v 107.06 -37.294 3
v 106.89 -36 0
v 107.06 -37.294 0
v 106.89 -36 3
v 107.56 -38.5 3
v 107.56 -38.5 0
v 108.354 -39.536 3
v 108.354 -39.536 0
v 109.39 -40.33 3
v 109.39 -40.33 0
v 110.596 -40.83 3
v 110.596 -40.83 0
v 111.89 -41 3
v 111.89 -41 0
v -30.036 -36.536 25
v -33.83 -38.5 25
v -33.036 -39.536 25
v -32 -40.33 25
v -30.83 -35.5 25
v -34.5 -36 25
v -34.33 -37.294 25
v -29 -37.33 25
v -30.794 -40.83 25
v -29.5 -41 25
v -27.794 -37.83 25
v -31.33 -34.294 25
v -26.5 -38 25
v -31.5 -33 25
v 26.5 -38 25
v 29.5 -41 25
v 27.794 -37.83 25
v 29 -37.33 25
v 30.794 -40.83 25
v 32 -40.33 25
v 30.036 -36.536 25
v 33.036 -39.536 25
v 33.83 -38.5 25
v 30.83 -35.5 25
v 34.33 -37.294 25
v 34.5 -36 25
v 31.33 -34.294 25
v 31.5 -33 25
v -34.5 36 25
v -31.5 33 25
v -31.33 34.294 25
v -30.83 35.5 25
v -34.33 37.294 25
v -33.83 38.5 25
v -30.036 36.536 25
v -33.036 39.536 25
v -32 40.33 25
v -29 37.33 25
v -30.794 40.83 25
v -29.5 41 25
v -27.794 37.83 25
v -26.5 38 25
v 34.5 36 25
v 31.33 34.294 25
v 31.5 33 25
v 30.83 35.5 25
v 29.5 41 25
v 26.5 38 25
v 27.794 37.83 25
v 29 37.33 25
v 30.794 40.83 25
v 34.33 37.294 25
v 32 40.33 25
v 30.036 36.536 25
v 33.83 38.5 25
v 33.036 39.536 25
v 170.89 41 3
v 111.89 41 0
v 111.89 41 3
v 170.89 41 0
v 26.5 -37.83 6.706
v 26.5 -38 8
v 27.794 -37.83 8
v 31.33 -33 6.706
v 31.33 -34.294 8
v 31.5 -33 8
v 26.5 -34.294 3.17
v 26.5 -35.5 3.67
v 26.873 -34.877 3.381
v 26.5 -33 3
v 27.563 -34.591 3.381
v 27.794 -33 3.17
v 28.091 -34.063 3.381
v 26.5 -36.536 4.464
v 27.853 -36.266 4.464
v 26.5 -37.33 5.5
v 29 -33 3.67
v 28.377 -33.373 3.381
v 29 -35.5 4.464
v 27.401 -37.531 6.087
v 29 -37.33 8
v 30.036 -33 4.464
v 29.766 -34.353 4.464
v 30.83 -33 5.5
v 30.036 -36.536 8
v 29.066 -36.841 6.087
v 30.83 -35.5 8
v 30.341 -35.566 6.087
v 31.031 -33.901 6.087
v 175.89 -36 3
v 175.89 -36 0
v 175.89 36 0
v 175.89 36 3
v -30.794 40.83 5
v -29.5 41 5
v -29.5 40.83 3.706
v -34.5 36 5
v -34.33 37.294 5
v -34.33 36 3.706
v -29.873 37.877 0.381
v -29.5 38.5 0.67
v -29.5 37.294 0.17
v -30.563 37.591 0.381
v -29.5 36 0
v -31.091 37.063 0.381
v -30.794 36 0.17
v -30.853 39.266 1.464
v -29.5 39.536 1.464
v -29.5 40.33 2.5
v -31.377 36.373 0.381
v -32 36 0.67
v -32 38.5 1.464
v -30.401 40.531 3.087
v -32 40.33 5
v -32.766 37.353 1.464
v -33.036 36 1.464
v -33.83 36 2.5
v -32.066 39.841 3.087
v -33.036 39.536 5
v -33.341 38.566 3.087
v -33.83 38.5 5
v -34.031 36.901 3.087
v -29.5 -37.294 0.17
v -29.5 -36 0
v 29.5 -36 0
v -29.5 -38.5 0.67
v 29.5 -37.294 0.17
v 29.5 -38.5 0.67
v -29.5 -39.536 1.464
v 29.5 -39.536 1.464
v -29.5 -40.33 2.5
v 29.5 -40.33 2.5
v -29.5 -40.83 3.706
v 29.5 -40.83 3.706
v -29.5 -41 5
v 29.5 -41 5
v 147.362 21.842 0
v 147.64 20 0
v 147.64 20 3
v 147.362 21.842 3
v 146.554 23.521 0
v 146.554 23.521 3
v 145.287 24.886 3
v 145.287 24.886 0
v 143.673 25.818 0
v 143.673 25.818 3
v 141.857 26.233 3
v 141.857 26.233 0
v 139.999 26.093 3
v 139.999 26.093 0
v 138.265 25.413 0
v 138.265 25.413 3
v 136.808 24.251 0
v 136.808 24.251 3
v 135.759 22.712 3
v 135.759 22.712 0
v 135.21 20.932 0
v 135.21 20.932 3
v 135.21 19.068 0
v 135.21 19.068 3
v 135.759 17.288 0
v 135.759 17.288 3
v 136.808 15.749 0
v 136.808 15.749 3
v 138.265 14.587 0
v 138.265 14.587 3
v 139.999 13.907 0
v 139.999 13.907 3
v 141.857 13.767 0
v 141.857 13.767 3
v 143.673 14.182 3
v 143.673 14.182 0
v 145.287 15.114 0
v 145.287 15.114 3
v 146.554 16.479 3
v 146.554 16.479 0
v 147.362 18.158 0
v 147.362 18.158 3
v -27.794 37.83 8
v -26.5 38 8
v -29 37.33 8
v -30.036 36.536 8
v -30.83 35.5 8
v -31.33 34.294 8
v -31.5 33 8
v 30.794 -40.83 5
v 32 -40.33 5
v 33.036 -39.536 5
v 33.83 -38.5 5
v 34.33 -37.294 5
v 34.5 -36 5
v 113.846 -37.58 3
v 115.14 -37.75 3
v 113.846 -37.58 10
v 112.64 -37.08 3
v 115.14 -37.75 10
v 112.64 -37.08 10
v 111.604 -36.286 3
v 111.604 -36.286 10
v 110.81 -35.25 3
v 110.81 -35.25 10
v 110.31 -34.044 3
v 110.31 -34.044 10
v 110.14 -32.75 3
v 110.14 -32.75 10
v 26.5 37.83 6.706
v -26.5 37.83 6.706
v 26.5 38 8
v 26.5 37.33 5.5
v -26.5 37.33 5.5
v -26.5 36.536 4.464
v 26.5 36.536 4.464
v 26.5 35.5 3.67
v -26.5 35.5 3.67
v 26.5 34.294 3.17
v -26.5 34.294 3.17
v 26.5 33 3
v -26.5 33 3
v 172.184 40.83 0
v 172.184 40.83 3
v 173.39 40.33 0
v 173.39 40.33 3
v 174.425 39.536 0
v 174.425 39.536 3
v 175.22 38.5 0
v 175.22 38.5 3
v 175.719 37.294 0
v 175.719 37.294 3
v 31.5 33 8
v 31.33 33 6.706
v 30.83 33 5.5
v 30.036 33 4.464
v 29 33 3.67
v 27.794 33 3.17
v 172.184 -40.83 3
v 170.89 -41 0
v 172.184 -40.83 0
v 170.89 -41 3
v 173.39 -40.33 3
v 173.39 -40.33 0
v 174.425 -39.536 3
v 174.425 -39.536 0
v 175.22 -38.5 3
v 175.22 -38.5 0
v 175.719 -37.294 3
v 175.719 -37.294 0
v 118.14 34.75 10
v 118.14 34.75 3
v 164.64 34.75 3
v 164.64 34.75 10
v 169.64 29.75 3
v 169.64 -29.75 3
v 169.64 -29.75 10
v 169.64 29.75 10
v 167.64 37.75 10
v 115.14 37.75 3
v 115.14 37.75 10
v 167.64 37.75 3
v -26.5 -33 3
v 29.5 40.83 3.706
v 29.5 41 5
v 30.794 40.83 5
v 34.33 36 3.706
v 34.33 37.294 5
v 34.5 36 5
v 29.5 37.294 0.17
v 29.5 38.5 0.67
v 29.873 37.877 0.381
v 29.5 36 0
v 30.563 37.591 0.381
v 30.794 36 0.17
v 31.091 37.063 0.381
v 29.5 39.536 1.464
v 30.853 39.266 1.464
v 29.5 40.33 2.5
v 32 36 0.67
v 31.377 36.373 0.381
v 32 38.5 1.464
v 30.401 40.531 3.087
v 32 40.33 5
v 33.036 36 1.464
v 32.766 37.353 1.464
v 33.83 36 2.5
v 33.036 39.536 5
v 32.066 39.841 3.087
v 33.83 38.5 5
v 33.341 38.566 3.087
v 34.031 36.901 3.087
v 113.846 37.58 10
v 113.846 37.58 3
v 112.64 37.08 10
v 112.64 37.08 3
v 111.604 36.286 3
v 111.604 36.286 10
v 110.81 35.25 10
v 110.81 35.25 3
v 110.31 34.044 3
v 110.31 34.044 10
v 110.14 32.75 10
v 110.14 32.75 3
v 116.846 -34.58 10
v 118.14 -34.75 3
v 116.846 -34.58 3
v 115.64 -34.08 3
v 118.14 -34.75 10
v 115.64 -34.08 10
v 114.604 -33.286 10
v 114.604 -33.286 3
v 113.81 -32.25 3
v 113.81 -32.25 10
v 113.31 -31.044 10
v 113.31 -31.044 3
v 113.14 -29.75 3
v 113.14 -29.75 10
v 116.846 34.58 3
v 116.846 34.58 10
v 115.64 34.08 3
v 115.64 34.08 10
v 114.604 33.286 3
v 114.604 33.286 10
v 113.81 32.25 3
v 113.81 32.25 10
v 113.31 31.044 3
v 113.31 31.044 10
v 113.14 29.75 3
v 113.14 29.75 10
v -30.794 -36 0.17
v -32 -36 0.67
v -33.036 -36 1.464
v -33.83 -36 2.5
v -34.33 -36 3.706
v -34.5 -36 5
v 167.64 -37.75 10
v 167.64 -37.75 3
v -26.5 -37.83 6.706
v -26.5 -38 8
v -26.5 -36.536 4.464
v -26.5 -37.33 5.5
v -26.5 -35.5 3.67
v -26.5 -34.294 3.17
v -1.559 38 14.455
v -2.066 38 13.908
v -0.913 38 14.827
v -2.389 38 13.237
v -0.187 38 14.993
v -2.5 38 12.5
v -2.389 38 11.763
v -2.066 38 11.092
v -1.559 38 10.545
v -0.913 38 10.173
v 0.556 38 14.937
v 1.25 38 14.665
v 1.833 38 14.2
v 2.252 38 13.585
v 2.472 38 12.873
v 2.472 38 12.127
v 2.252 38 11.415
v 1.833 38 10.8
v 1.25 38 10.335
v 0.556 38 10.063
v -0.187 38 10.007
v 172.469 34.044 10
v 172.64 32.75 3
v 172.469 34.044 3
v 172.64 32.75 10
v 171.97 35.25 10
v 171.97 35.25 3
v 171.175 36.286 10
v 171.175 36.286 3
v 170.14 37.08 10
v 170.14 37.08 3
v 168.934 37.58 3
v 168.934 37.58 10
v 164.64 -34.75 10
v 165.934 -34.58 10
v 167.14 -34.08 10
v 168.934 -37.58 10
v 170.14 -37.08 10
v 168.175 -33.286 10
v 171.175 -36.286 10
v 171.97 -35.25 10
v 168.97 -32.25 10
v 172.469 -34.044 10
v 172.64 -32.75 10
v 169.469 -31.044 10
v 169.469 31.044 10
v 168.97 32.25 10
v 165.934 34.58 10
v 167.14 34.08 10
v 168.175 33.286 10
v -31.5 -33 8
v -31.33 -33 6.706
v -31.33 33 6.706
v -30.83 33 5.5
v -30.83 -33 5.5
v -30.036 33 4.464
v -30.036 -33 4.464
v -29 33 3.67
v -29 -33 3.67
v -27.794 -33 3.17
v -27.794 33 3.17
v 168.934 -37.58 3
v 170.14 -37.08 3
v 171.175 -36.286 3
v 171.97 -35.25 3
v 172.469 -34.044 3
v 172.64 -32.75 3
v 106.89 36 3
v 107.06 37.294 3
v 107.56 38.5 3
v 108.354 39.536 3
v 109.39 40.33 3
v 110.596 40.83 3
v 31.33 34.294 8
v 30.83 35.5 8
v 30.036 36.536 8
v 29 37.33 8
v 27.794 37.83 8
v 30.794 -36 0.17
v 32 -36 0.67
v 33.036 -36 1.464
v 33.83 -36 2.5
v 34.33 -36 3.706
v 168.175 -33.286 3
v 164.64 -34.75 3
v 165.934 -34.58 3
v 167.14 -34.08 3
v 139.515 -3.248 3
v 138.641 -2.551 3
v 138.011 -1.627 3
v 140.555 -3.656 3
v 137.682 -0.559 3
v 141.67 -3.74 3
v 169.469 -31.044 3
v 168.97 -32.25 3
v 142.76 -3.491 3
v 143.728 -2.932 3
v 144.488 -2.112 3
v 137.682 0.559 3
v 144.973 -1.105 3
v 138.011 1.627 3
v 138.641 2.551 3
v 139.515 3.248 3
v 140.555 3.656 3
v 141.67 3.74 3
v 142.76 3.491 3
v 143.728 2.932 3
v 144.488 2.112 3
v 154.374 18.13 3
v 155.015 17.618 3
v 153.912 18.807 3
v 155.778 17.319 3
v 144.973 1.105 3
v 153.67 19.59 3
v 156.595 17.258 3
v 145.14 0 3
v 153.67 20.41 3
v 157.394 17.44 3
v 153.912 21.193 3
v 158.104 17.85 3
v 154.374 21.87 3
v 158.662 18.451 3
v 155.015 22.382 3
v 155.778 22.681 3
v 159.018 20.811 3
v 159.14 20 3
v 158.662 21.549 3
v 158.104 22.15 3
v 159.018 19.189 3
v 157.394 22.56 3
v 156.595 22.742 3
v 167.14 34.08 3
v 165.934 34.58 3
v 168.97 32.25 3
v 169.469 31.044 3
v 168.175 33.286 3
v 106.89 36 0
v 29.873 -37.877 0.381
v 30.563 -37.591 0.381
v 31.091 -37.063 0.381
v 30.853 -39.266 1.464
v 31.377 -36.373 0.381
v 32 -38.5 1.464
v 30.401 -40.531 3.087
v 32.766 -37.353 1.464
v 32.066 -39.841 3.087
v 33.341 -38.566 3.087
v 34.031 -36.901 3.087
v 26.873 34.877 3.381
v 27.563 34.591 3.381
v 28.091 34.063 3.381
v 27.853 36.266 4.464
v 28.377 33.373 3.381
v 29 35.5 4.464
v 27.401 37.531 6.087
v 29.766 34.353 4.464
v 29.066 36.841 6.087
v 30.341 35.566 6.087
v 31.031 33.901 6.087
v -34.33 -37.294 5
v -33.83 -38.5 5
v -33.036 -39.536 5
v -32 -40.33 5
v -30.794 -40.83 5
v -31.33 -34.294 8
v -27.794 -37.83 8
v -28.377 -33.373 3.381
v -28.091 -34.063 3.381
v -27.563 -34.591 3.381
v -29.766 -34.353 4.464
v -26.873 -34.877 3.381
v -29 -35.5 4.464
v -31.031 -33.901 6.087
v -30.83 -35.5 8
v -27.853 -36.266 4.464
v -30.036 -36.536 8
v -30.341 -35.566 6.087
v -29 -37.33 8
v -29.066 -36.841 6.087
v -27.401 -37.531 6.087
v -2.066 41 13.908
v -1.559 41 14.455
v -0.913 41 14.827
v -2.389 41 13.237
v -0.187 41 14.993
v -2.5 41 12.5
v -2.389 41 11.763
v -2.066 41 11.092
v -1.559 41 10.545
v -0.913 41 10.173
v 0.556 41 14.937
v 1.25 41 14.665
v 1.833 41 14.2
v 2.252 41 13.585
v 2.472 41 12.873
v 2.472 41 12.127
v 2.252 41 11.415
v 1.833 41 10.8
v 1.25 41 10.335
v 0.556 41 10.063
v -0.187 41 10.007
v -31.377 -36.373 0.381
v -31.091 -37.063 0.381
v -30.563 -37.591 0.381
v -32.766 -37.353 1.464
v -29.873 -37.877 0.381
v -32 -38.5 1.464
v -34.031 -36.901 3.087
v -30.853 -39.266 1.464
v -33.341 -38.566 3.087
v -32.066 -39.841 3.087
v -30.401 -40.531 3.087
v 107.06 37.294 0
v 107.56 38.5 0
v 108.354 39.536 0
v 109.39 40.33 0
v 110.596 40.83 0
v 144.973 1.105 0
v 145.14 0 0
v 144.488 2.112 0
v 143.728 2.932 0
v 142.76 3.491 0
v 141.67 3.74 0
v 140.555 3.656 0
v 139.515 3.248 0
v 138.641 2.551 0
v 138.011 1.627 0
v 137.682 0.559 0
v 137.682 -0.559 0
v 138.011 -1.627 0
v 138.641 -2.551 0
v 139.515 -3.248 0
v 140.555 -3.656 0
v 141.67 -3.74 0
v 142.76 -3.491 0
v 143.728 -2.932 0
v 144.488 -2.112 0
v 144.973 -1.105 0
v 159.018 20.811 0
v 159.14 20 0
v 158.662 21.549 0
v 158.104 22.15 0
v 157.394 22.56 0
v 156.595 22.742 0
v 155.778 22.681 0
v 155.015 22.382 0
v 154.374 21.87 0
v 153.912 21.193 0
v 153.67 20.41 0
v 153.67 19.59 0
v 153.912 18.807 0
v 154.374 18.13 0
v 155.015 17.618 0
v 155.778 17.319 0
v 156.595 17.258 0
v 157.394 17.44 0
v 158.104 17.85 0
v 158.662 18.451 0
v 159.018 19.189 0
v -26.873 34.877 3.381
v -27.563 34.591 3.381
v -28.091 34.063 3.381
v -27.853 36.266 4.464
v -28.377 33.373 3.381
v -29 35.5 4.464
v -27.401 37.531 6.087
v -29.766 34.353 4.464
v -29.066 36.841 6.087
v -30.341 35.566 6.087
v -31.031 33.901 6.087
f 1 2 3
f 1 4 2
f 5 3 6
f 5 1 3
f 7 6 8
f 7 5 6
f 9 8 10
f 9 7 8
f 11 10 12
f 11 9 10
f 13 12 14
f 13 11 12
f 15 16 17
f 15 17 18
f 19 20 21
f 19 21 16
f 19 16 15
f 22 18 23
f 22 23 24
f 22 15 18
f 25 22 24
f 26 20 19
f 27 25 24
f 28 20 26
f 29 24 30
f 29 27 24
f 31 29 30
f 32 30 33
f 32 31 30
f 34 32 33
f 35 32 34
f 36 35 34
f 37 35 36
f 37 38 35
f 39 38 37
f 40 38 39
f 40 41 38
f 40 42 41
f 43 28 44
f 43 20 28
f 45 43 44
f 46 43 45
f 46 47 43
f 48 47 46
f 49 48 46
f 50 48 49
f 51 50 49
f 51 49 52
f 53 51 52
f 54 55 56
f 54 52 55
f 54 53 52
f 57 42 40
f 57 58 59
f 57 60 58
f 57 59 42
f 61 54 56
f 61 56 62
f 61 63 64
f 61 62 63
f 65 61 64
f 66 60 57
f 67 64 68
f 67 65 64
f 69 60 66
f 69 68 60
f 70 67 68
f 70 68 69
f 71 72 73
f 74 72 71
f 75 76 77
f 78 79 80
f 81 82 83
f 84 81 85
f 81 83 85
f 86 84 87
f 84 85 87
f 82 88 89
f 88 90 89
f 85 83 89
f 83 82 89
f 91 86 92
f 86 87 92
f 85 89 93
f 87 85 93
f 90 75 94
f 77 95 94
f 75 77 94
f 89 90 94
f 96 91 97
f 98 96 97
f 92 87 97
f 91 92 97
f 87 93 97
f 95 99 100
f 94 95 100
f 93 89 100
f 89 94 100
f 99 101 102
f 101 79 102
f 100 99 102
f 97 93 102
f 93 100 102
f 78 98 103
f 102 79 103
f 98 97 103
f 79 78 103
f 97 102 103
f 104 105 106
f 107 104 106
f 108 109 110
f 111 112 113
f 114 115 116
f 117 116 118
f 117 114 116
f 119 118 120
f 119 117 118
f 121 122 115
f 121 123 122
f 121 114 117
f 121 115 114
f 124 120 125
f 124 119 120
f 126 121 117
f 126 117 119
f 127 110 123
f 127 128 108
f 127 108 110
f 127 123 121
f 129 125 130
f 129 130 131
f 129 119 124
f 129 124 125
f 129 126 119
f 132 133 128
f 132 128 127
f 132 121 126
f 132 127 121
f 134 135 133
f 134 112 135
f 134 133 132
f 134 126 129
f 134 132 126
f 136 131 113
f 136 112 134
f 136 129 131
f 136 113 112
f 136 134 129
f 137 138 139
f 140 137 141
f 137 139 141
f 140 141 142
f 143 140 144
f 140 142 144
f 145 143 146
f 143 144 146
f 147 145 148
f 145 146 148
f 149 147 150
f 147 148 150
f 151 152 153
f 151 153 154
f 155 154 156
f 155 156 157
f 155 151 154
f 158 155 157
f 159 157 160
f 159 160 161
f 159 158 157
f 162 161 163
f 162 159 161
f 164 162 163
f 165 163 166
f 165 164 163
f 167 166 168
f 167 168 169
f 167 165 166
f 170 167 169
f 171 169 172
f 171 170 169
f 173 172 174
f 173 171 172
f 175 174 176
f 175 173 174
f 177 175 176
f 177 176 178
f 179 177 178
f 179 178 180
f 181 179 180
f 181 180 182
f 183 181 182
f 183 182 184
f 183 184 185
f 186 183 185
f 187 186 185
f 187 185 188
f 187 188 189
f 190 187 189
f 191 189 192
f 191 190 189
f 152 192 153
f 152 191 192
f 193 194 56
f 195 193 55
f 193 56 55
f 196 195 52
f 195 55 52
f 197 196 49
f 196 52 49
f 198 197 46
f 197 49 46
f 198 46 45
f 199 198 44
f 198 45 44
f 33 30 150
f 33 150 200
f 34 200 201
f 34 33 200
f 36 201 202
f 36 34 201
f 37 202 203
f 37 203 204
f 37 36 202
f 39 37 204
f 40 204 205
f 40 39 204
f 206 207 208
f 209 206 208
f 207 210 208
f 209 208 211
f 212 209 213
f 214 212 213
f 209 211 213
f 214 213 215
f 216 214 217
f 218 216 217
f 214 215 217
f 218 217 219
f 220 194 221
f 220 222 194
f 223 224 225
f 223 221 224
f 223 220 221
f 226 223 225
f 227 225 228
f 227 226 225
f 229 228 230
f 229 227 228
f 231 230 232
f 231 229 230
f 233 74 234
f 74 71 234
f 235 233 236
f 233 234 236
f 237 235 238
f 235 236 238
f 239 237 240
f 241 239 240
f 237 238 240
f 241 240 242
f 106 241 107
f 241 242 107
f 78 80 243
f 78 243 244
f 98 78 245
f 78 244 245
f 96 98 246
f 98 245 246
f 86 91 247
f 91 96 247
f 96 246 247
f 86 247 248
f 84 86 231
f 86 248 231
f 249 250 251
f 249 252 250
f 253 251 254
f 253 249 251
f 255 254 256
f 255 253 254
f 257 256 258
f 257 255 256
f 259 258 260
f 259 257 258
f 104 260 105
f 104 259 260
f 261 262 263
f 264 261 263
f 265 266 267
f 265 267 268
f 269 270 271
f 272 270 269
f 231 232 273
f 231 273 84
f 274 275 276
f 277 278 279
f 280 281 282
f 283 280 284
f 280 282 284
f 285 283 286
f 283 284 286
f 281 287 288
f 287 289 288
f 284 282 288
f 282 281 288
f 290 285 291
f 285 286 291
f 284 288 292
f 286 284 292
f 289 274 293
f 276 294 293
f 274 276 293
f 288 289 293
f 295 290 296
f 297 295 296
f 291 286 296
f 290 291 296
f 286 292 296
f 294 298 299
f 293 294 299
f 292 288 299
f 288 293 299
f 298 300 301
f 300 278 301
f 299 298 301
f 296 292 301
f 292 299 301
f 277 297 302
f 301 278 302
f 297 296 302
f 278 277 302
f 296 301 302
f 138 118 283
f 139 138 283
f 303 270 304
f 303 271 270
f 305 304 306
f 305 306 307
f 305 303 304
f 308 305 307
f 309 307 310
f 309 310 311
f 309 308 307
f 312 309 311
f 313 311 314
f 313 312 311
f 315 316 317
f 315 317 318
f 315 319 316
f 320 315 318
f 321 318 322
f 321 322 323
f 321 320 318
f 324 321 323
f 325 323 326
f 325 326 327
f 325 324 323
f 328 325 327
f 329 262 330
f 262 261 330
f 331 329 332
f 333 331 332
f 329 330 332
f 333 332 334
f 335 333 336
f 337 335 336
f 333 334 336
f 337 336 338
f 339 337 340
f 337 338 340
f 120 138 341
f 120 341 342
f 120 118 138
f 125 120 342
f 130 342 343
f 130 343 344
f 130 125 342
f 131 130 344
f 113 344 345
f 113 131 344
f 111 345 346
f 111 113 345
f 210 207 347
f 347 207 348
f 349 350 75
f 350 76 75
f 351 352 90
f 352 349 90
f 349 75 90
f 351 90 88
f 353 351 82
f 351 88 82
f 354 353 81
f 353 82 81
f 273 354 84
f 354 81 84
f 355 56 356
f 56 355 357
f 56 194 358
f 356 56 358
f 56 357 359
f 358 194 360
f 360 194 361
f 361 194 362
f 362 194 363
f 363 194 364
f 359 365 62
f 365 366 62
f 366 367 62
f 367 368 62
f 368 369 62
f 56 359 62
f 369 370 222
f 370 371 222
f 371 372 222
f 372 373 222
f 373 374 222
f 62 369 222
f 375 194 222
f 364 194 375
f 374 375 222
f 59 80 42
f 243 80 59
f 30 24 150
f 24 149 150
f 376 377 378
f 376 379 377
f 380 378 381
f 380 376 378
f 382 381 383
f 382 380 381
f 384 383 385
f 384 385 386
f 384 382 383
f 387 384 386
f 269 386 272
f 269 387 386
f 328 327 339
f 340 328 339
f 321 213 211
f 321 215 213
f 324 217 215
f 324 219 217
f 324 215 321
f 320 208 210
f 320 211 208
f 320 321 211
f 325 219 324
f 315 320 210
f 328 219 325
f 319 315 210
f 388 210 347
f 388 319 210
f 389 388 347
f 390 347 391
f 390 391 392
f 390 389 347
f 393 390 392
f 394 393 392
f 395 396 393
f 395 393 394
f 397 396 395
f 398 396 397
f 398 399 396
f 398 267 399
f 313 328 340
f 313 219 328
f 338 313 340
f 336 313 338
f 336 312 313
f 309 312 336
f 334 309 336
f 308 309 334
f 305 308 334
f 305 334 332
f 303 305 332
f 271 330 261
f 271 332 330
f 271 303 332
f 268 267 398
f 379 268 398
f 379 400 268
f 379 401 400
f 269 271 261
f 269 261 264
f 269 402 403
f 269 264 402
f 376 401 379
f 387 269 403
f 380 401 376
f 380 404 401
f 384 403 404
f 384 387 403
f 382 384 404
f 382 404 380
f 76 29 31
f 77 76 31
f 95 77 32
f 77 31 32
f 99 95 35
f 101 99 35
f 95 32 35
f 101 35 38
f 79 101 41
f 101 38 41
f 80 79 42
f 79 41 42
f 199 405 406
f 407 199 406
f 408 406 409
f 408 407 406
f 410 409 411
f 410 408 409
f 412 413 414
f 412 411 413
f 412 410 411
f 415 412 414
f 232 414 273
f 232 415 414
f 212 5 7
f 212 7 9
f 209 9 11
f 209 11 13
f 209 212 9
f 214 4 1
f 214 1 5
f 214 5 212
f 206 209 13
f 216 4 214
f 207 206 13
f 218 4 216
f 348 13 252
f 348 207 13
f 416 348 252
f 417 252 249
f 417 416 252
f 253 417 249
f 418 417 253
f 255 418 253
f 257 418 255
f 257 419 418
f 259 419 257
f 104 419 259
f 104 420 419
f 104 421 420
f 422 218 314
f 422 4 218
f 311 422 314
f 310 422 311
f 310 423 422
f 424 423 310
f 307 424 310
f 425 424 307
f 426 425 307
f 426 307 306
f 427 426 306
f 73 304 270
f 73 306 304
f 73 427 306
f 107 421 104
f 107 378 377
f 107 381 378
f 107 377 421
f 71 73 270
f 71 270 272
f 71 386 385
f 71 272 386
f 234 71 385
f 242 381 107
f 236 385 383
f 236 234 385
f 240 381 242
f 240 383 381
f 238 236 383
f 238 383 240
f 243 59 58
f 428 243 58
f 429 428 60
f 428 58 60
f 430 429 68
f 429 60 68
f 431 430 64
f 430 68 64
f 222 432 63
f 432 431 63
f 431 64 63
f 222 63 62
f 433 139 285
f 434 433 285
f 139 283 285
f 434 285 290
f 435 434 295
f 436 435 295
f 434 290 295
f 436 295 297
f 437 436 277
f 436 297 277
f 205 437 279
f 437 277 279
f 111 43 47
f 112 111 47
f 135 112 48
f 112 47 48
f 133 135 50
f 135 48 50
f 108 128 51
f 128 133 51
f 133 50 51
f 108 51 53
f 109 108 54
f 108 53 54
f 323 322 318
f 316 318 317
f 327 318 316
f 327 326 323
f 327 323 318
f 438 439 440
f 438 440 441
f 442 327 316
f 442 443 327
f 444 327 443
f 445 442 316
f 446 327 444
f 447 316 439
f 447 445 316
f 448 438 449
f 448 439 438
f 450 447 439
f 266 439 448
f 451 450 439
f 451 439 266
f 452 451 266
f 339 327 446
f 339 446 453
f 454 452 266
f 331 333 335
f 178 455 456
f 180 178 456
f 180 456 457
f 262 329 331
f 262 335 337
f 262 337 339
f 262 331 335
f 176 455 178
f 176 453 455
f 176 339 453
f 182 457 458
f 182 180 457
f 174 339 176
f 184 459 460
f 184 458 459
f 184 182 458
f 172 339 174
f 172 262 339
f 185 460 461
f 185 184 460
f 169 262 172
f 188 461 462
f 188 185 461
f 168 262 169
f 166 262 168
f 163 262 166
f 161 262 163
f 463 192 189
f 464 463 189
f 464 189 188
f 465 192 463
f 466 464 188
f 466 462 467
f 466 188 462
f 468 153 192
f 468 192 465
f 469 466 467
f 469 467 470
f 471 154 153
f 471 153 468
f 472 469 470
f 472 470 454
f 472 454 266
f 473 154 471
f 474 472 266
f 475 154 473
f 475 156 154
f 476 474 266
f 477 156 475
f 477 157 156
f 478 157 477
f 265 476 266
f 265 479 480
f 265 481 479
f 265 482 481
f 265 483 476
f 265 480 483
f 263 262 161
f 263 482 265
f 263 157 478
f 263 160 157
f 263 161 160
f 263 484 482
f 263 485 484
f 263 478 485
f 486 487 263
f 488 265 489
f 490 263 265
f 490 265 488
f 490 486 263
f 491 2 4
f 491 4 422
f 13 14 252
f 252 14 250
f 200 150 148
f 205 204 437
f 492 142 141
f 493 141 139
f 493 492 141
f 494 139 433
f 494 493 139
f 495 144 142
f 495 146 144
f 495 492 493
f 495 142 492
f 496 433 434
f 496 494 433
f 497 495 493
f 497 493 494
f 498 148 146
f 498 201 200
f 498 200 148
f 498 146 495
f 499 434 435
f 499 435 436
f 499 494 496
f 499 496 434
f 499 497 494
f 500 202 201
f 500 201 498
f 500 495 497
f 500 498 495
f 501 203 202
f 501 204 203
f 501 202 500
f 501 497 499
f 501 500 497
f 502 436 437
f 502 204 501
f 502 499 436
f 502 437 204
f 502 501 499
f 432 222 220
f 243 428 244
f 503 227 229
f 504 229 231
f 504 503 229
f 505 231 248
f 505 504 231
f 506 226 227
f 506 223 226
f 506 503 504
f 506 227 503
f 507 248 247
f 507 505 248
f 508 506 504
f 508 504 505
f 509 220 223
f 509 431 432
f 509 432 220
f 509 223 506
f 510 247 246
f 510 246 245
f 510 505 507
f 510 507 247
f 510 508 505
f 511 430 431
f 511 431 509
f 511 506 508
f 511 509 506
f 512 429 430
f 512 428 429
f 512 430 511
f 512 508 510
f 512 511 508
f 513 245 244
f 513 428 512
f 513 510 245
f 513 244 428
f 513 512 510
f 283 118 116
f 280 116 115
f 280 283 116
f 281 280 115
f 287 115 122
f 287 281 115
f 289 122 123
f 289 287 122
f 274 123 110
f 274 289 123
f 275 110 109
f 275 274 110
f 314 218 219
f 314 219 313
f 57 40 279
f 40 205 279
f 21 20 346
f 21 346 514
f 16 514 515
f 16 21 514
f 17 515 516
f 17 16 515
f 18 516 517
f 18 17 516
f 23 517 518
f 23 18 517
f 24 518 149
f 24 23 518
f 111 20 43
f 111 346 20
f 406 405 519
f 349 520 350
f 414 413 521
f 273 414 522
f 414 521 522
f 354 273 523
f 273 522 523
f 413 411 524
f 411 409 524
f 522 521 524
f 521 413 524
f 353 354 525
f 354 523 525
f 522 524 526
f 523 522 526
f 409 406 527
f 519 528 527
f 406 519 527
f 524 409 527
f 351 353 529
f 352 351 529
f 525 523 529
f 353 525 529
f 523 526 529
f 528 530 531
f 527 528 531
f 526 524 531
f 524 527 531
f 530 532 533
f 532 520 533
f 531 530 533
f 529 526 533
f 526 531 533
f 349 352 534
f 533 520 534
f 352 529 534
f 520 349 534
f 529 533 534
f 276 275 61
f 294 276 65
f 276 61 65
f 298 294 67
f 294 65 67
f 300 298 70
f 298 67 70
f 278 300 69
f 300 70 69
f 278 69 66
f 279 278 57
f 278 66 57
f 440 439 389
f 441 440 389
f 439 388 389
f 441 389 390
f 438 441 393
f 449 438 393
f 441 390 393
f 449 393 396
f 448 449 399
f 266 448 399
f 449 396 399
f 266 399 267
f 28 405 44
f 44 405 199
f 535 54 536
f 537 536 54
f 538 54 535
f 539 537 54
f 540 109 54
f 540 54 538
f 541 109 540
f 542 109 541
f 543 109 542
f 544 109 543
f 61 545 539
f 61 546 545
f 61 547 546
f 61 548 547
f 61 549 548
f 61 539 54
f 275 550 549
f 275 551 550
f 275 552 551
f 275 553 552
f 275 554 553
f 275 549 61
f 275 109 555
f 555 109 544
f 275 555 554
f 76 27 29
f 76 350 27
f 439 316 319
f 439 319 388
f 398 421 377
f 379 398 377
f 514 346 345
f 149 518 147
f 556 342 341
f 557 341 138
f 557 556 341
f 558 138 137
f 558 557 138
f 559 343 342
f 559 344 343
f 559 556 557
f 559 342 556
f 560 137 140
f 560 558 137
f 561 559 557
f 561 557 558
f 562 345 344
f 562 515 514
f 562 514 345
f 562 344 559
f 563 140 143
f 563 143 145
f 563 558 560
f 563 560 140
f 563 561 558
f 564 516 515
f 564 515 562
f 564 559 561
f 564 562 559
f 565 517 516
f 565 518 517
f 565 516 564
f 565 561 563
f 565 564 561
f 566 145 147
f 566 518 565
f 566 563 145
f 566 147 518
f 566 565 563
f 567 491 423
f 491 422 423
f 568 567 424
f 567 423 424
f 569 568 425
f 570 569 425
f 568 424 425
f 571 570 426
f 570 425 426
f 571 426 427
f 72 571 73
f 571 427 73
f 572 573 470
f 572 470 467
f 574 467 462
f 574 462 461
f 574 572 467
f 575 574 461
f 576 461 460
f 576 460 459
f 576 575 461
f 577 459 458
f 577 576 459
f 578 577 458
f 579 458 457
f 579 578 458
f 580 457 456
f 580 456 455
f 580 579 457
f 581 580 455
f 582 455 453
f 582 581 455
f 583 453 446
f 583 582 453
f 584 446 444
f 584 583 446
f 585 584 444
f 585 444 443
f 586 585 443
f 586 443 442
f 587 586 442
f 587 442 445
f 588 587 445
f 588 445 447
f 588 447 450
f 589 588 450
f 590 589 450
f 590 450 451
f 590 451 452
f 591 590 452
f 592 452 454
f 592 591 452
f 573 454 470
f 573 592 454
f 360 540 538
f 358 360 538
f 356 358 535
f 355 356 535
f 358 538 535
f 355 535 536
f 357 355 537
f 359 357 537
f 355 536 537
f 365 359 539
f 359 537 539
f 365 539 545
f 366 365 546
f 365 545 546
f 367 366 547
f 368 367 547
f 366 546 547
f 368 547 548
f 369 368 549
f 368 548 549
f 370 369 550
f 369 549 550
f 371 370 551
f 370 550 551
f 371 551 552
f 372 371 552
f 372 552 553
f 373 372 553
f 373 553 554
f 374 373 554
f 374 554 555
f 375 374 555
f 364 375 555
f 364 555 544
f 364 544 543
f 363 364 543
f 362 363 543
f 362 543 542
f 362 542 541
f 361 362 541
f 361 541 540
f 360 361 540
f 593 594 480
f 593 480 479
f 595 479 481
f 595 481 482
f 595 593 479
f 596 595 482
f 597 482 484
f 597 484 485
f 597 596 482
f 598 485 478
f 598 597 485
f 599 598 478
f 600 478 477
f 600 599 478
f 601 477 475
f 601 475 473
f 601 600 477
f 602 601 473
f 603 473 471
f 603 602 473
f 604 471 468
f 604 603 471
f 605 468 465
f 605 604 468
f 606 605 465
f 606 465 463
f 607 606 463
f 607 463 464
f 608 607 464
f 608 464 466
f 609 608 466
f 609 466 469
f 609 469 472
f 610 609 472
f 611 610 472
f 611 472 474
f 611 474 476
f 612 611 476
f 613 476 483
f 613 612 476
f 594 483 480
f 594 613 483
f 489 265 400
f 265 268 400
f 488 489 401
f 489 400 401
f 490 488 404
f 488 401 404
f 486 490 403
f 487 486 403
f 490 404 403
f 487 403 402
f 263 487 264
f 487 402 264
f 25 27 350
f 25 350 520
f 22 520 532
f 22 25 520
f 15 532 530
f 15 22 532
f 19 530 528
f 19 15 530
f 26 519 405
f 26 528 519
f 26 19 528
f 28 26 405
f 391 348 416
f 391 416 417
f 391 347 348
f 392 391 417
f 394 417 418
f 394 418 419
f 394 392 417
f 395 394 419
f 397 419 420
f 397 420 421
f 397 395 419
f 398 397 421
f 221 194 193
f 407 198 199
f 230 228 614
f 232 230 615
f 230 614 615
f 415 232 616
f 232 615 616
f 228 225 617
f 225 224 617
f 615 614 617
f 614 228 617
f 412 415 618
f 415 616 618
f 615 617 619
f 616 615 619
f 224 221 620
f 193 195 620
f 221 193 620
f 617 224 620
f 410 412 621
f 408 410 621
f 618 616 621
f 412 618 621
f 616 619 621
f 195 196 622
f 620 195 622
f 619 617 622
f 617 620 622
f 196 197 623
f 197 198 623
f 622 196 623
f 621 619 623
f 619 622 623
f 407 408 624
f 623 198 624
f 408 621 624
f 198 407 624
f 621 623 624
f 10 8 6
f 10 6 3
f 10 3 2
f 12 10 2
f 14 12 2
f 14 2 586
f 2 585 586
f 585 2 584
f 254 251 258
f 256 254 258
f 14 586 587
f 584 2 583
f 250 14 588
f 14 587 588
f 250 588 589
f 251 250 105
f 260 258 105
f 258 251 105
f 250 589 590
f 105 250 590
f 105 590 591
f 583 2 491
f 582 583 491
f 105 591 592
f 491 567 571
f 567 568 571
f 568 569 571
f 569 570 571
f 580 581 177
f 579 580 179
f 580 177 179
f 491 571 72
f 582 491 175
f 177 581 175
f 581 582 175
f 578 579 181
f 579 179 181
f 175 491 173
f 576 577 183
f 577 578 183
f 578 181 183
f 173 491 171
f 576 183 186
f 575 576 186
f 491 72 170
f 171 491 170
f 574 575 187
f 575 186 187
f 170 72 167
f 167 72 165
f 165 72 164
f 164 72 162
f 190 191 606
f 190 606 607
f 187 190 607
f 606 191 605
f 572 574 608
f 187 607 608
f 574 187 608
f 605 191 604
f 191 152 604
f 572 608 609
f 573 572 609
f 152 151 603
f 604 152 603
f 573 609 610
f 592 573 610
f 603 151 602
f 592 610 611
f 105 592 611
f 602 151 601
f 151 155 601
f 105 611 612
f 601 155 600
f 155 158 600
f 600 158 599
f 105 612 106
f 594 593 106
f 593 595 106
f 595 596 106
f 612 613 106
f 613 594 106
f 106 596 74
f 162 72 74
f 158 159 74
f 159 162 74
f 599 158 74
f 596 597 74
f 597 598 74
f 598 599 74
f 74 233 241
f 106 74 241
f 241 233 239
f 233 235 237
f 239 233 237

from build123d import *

# Parameters (mm, degrees)
F0_W     = 69
F0_H     = 82
F0_W_2   = 63
F0_H_2   = 76
F1_DEPTH = 25
F2_DEPTH = 3
F0_W_3   = 62.5
F0_H_3   = 75.5
F0_W_4   = 56.5
F0_H_4   = 69.5
F3_DEPTH = 10
F0_R     = 3.75
F0_R_2   = 6.25
F0_R_3   = 2.75
F4_DEPTH = 3
F5_R     = 5
F5_2_R   = 5
F6_R     = 2.5
F7_DEPTH = 25


with BuildPart() as f1:
    # F0 (on Top) → F1 (new body)
    with BuildSketch(Plane.XY):
        Rectangle(F0_W, F0_H)
        Rectangle(F0_W_2, F0_H_2, mode=Mode.SUBTRACT)
    extrude(amount=F1_DEPTH)

    # F0 (on Top) → F2 (join)
    with BuildSketch(Plane.XY):
        Rectangle(F0_W_2, F0_H_2)
    extrude(amount=F2_DEPTH)

    # F5
    f5_edges = [f1.edges().sort_by_distance(p)[0] for p in [
        (34.5, 41, 12.5),
        (31.5, 38, 14),
        (-31.5, 38, 14),
        (-34.5, 41, 12.5),
        (34.5, -41, 12.5),
        (31.5, -38, 14),
        (-34.5, -41, 12.5),
        (-31.5, -38, 14),
        (0, 41, 0),
        (-34.5, 0, 0),
        (0, -41, 0),
        (34.5, 0, 0),
        (0, 38, 3),
        (-31.5, 0, 3),
        (0, -38, 3),
        (31.5, 0, 3),
    ]]
    fillet(f5_edges, radius=F5_R)

    # F6 (on face) → F7 (cut)
    with BuildSketch(Plane(origin=(0, 41, 0), x_dir=(-1, 0, 0), z_dir=(0, 1, 0))):
        with Locations((0, 12.5)):
            Circle(F6_R)
    extrude(amount=-F7_DEPTH, mode=Mode.SUBTRACT)


with BuildPart() as f3:
    # F0 (on Top) → F3 (new body)
    with BuildSketch(Plane.XY):
        with Locations((141.389757, 0)):
            Rectangle(F0_W_3, F0_H_3)
        with Locations((141.389757, 0)):
            Rectangle(F0_W_4, F0_H_4, mode=Mode.SUBTRACT)
    extrude(amount=F3_DEPTH)

    # F0 (on Top) → F4 (join)
    with BuildSketch(Plane.XY):
        with Locations((141.389757, 0)):
            Rectangle(F0_W, F0_H)
        with Locations((141.389757, 0)):
            Rectangle(F0_W_3, F0_H_3, mode=Mode.SUBTRACT)
        with Locations((141.389757, 0)):
            Rectangle(F0_W_4, F0_H_4)
        with Locations((141.389757, 0)):
            Circle(F0_R, mode=Mode.SUBTRACT)
        with Locations((141.389757, 20)):
            Circle(F0_R_2, mode=Mode.SUBTRACT)
        with Locations((156.389757, 20)):
            Circle(F0_R_3, mode=Mode.SUBTRACT)
    extrude(amount=F4_DEPTH)

    # F5#2
    f5_2_edges = [f3.edges().sort_by_distance(p)[0] for p in [
        (106.889757, -41, 1.5),
        (172.639757, -37.75, 6.5),
        (172.639757, 37.75, 6.5),
        (110.139757, 37.75, 6.5),
        (169.639757, 34.75, 6.5),
        (113.139757, 34.75, 6.5),
        (169.639757, -34.75, 6.5),
        (113.139757, -34.75, 6.5),
        (175.889757, 41, 1.5),
        (175.889757, -41, 1.5),
        (106.889757, 41, 1.5),
        (110.139757, -37.75, 6.5),
    ]]
    fillet(f5_2_edges, radius=F5_2_R)


solid = Compound([f1.part, f3.part])
